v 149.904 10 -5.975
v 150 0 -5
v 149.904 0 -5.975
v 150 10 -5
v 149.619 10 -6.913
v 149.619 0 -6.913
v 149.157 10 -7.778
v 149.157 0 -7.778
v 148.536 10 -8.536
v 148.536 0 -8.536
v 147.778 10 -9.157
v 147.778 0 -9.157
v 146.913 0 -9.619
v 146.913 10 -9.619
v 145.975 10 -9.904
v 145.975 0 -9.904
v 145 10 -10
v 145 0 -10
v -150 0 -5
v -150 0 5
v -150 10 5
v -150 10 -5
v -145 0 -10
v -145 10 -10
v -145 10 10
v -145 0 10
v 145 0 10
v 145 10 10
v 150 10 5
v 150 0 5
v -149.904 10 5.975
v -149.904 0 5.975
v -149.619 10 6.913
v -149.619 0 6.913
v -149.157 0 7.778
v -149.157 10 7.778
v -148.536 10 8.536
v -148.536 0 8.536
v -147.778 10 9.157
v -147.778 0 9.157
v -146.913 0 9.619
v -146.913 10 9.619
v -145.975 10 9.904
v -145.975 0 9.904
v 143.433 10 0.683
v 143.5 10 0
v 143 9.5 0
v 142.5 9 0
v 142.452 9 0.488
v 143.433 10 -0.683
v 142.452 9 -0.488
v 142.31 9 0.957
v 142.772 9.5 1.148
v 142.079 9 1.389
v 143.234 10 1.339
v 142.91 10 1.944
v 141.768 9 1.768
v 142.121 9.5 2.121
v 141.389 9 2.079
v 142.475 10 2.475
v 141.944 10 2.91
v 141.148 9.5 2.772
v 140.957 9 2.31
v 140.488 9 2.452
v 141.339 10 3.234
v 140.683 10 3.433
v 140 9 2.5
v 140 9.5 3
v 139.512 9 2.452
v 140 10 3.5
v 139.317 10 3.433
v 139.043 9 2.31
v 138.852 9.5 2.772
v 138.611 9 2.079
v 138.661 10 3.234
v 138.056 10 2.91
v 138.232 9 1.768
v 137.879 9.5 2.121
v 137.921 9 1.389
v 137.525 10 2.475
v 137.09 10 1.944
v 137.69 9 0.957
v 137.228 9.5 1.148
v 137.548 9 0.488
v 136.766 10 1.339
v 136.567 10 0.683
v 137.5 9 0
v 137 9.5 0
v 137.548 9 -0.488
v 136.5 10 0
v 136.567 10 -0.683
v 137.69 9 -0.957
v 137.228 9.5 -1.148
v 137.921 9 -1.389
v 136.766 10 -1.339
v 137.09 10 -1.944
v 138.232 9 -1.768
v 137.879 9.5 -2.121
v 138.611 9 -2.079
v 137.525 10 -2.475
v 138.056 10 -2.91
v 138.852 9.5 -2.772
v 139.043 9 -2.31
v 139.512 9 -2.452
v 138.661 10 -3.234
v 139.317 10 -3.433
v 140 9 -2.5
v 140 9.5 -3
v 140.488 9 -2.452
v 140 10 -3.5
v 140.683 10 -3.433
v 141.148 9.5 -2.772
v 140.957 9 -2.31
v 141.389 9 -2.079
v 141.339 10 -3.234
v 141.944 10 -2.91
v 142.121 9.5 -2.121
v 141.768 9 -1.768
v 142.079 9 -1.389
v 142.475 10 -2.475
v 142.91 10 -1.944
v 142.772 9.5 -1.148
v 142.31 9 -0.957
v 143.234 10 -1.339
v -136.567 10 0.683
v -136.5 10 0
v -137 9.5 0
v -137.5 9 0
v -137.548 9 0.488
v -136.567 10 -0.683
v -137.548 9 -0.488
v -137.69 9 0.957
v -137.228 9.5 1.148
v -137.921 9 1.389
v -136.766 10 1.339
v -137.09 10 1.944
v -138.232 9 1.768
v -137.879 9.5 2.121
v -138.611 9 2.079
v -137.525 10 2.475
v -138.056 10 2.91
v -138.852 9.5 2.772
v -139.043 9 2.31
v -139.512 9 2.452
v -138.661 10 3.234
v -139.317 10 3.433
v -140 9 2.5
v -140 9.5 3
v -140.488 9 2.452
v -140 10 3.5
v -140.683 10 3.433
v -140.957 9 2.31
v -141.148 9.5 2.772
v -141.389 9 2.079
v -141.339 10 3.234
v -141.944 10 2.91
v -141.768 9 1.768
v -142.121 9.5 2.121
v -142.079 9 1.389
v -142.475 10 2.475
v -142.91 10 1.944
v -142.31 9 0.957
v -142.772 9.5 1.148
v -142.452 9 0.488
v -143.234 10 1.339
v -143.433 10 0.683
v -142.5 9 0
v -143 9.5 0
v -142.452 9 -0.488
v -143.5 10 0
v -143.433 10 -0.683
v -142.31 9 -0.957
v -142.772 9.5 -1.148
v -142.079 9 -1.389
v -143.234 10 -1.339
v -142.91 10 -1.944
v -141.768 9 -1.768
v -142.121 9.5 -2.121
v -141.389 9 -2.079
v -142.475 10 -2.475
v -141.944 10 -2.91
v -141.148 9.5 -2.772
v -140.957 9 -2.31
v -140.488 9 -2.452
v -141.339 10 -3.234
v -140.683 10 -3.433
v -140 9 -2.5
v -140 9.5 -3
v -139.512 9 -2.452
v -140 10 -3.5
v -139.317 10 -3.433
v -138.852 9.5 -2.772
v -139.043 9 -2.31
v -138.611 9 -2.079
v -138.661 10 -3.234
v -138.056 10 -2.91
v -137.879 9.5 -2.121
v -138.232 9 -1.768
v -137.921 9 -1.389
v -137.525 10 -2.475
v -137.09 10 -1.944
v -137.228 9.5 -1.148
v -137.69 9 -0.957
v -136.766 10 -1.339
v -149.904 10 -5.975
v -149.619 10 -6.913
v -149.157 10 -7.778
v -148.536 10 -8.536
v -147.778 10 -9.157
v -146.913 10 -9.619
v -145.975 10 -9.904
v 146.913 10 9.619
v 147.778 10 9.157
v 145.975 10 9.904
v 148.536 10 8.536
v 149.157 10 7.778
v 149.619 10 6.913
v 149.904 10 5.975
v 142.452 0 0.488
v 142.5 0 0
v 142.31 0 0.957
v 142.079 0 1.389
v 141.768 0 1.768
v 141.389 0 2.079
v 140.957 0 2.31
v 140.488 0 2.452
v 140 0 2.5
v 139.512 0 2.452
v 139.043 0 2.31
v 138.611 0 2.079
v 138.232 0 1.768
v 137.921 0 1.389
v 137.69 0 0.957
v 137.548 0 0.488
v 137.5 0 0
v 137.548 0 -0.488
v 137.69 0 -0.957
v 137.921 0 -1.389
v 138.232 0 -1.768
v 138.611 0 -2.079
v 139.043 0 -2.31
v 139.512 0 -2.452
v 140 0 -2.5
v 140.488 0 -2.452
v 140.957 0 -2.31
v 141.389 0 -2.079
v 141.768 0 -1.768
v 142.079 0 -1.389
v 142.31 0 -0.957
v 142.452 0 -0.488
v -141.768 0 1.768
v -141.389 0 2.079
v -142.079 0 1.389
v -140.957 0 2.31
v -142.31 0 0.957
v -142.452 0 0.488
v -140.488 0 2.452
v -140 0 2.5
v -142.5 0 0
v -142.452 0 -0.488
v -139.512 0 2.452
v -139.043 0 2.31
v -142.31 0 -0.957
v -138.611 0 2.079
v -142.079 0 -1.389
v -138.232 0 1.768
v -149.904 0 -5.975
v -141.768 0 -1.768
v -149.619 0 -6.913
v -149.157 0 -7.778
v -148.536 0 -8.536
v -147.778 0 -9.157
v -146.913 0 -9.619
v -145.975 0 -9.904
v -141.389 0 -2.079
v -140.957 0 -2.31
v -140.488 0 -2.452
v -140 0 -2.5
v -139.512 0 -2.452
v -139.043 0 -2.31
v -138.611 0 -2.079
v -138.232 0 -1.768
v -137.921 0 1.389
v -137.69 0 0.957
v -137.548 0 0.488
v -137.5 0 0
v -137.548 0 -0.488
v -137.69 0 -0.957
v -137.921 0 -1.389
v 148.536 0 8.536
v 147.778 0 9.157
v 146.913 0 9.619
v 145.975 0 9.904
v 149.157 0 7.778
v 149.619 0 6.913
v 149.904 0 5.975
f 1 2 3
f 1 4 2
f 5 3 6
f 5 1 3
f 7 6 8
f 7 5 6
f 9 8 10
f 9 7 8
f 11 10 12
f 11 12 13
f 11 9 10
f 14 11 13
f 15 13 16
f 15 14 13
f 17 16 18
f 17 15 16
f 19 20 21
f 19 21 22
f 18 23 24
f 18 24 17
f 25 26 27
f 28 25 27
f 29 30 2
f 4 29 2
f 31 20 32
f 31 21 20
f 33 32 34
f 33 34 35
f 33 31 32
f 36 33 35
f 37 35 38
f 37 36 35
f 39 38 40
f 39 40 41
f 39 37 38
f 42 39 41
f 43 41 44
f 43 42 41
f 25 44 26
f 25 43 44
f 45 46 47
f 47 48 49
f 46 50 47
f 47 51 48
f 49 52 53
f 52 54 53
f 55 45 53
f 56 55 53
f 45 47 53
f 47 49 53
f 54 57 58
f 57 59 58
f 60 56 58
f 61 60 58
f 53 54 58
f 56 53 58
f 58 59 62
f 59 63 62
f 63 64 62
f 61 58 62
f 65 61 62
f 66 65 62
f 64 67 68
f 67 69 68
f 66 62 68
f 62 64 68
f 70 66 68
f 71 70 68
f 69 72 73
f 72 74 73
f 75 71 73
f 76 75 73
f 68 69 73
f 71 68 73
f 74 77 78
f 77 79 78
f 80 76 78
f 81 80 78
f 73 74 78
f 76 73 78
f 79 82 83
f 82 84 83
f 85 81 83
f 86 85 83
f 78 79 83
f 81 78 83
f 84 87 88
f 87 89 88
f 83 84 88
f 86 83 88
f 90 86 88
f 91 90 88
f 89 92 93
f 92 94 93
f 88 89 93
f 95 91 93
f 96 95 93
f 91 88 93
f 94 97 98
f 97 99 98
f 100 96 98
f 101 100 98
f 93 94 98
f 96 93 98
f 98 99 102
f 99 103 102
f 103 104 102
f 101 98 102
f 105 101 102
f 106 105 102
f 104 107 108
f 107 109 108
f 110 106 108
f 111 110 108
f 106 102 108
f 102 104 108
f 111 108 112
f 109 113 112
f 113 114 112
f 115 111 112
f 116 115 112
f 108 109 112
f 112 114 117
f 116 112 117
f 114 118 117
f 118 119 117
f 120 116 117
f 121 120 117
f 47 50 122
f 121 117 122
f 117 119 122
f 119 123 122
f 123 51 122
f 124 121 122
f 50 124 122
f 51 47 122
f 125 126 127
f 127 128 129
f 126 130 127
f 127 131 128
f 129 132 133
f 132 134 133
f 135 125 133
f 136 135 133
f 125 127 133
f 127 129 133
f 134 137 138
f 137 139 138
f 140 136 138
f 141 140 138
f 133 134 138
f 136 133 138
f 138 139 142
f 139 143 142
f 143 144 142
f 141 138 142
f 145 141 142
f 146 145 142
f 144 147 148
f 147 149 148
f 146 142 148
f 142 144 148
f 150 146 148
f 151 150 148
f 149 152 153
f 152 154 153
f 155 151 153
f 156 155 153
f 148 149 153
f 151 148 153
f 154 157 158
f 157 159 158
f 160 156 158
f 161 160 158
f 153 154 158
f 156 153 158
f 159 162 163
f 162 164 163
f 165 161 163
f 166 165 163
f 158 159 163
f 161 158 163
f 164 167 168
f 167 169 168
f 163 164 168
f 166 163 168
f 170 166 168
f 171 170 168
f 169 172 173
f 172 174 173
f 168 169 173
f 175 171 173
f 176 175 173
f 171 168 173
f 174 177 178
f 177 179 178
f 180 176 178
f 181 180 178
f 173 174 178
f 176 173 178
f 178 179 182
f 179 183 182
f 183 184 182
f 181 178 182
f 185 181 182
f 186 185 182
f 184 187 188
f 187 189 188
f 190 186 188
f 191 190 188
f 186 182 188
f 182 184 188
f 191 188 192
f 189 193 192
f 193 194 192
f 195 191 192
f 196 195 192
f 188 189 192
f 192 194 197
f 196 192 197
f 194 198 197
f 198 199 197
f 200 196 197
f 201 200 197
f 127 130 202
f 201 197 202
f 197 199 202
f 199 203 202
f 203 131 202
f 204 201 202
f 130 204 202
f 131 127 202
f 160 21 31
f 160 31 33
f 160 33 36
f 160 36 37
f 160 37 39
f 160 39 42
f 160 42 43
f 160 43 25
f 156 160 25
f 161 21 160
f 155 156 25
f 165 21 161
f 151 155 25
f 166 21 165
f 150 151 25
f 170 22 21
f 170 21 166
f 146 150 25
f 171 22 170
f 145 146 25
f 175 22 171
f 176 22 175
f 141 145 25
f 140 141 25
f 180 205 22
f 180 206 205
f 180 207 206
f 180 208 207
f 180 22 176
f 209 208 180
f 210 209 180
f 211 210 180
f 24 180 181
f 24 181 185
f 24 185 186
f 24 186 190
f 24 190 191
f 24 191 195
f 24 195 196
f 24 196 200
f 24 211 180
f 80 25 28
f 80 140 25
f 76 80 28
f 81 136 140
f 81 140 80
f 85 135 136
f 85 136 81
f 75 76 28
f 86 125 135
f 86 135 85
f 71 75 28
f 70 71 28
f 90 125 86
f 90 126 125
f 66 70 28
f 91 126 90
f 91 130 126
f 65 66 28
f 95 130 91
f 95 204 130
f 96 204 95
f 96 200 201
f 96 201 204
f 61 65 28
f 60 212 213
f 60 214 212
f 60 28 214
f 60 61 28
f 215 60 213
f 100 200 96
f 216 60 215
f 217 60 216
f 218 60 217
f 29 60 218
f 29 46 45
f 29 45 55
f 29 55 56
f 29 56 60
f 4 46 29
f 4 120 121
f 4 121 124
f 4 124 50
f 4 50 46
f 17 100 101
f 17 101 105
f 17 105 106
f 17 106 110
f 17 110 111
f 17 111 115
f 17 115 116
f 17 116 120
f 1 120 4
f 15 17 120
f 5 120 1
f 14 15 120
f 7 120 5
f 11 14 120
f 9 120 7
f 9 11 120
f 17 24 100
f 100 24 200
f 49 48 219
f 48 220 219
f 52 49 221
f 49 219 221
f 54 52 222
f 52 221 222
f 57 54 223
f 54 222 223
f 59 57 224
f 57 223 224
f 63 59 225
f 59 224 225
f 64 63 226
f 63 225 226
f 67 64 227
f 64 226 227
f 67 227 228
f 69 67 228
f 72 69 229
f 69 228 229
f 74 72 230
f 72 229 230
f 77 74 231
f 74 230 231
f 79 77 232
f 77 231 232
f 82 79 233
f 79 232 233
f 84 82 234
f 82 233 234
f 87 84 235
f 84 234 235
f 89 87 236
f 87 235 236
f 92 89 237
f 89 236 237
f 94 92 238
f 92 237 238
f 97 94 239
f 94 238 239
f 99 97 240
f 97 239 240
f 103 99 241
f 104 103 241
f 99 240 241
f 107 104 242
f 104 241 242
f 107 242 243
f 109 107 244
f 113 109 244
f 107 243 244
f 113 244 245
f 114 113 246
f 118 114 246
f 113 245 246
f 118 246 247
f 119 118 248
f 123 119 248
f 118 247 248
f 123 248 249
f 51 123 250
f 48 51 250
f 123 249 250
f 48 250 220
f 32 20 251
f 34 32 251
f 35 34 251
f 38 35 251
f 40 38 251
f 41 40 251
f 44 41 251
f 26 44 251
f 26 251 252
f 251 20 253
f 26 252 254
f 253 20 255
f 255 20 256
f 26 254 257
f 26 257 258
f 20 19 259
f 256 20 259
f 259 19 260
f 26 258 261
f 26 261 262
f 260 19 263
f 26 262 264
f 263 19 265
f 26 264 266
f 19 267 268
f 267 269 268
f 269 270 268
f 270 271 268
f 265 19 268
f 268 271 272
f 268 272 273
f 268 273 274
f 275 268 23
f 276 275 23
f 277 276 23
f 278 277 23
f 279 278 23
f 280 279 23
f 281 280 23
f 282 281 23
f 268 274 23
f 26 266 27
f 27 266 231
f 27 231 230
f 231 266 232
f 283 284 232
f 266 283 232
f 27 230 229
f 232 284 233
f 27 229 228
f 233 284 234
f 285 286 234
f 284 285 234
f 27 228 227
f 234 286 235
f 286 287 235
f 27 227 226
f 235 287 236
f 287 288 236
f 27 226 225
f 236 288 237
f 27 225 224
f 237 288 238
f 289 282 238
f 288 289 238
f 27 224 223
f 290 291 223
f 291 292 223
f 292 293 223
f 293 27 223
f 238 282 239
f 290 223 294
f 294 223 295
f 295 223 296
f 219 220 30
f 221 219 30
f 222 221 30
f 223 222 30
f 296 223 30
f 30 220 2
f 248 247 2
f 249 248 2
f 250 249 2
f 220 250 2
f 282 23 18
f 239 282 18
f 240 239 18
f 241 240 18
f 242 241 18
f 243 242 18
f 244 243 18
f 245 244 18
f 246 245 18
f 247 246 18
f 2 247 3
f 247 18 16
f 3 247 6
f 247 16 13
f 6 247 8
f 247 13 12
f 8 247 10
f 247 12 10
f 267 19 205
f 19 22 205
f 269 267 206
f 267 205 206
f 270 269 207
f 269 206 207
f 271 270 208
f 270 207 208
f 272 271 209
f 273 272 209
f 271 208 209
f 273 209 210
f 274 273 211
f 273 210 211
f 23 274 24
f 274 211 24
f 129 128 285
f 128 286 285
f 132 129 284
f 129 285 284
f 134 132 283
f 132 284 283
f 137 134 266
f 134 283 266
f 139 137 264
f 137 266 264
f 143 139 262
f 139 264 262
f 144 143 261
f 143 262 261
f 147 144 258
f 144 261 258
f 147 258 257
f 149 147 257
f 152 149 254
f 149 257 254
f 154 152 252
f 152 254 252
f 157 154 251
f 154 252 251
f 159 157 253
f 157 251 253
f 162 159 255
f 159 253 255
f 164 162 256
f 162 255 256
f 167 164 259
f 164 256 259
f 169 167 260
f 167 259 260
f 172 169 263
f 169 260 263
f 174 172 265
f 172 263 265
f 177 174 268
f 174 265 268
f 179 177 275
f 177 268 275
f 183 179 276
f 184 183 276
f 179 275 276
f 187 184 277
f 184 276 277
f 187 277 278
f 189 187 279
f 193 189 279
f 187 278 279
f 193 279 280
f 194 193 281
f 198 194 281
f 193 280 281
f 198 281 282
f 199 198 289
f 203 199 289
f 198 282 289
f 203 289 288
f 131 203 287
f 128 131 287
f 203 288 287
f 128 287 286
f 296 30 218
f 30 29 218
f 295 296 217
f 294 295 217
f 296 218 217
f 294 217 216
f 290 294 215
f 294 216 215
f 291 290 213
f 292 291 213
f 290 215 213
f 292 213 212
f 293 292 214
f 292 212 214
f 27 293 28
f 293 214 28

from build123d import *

# Parameters (mm, degrees)
SCHIZZO1_W                      = 300
SCHIZZO1_H                      = 20
ESTRUSIONE_ESTRUSIONE1_DEPTH    = 10
FORO_FILETTATO_M6_1_D           = 5
FORO_FILETTATO_M6_1_DEPTH       = 11
FORO_FILETTATO_M6_1_CSINK_D     = 7
FORO_FILETTATO_M6_1_CSINK_ANGLE = 90
FORO_FILETTATO_M6_1_TIP         = 1.502151548
RACCORDO1_R                     = 5


with BuildPart() as part:
    # Schizzo1 → Estrusione-Estrusione1 (new body)
    with BuildSketch(Plane(origin=(0, 0, 0), x_dir=(1, 0, 0), z_dir=(0, 1, 0))):
        Rectangle(SCHIZZO1_W, SCHIZZO1_H)
    extrude(amount=ESTRUSIONE_ESTRUSIONE1_DEPTH)

    # Foro filettato M6-1
    with Locations(Plane(origin=(0, 10, 0), x_dir=(-1, 0, 0), z_dir=(0, 1, 0))):
        with Locations((140, 0), (-140, 0)):
            CounterSinkHole(FORO_FILETTATO_M6_1_D / 2, FORO_FILETTATO_M6_1_CSINK_D / 2, depth=FORO_FILETTATO_M6_1_DEPTH, counter_sink_angle=FORO_FILETTATO_M6_1_CSINK_ANGLE)
            with Locations((0, 0, -(FORO_FILETTATO_M6_1_DEPTH + FORO_FILETTATO_M6_1_TIP / 2))):  # 118° drill point
                Cone(0, FORO_FILETTATO_M6_1_D / 2, FORO_FILETTATO_M6_1_TIP, mode=Mode.SUBTRACT)

    # Raccordo1
    raccordo1_edges = [part.edges().sort_by_distance(p)[0] for p in [
        (-150, 5, -10),
        (150, 5, -10),
        (150, 5, 10),
        (-150, 5, 10),
    ]]
    fillet(raccordo1_edges, radius=RACCORDO1_R)


solid = part.part
